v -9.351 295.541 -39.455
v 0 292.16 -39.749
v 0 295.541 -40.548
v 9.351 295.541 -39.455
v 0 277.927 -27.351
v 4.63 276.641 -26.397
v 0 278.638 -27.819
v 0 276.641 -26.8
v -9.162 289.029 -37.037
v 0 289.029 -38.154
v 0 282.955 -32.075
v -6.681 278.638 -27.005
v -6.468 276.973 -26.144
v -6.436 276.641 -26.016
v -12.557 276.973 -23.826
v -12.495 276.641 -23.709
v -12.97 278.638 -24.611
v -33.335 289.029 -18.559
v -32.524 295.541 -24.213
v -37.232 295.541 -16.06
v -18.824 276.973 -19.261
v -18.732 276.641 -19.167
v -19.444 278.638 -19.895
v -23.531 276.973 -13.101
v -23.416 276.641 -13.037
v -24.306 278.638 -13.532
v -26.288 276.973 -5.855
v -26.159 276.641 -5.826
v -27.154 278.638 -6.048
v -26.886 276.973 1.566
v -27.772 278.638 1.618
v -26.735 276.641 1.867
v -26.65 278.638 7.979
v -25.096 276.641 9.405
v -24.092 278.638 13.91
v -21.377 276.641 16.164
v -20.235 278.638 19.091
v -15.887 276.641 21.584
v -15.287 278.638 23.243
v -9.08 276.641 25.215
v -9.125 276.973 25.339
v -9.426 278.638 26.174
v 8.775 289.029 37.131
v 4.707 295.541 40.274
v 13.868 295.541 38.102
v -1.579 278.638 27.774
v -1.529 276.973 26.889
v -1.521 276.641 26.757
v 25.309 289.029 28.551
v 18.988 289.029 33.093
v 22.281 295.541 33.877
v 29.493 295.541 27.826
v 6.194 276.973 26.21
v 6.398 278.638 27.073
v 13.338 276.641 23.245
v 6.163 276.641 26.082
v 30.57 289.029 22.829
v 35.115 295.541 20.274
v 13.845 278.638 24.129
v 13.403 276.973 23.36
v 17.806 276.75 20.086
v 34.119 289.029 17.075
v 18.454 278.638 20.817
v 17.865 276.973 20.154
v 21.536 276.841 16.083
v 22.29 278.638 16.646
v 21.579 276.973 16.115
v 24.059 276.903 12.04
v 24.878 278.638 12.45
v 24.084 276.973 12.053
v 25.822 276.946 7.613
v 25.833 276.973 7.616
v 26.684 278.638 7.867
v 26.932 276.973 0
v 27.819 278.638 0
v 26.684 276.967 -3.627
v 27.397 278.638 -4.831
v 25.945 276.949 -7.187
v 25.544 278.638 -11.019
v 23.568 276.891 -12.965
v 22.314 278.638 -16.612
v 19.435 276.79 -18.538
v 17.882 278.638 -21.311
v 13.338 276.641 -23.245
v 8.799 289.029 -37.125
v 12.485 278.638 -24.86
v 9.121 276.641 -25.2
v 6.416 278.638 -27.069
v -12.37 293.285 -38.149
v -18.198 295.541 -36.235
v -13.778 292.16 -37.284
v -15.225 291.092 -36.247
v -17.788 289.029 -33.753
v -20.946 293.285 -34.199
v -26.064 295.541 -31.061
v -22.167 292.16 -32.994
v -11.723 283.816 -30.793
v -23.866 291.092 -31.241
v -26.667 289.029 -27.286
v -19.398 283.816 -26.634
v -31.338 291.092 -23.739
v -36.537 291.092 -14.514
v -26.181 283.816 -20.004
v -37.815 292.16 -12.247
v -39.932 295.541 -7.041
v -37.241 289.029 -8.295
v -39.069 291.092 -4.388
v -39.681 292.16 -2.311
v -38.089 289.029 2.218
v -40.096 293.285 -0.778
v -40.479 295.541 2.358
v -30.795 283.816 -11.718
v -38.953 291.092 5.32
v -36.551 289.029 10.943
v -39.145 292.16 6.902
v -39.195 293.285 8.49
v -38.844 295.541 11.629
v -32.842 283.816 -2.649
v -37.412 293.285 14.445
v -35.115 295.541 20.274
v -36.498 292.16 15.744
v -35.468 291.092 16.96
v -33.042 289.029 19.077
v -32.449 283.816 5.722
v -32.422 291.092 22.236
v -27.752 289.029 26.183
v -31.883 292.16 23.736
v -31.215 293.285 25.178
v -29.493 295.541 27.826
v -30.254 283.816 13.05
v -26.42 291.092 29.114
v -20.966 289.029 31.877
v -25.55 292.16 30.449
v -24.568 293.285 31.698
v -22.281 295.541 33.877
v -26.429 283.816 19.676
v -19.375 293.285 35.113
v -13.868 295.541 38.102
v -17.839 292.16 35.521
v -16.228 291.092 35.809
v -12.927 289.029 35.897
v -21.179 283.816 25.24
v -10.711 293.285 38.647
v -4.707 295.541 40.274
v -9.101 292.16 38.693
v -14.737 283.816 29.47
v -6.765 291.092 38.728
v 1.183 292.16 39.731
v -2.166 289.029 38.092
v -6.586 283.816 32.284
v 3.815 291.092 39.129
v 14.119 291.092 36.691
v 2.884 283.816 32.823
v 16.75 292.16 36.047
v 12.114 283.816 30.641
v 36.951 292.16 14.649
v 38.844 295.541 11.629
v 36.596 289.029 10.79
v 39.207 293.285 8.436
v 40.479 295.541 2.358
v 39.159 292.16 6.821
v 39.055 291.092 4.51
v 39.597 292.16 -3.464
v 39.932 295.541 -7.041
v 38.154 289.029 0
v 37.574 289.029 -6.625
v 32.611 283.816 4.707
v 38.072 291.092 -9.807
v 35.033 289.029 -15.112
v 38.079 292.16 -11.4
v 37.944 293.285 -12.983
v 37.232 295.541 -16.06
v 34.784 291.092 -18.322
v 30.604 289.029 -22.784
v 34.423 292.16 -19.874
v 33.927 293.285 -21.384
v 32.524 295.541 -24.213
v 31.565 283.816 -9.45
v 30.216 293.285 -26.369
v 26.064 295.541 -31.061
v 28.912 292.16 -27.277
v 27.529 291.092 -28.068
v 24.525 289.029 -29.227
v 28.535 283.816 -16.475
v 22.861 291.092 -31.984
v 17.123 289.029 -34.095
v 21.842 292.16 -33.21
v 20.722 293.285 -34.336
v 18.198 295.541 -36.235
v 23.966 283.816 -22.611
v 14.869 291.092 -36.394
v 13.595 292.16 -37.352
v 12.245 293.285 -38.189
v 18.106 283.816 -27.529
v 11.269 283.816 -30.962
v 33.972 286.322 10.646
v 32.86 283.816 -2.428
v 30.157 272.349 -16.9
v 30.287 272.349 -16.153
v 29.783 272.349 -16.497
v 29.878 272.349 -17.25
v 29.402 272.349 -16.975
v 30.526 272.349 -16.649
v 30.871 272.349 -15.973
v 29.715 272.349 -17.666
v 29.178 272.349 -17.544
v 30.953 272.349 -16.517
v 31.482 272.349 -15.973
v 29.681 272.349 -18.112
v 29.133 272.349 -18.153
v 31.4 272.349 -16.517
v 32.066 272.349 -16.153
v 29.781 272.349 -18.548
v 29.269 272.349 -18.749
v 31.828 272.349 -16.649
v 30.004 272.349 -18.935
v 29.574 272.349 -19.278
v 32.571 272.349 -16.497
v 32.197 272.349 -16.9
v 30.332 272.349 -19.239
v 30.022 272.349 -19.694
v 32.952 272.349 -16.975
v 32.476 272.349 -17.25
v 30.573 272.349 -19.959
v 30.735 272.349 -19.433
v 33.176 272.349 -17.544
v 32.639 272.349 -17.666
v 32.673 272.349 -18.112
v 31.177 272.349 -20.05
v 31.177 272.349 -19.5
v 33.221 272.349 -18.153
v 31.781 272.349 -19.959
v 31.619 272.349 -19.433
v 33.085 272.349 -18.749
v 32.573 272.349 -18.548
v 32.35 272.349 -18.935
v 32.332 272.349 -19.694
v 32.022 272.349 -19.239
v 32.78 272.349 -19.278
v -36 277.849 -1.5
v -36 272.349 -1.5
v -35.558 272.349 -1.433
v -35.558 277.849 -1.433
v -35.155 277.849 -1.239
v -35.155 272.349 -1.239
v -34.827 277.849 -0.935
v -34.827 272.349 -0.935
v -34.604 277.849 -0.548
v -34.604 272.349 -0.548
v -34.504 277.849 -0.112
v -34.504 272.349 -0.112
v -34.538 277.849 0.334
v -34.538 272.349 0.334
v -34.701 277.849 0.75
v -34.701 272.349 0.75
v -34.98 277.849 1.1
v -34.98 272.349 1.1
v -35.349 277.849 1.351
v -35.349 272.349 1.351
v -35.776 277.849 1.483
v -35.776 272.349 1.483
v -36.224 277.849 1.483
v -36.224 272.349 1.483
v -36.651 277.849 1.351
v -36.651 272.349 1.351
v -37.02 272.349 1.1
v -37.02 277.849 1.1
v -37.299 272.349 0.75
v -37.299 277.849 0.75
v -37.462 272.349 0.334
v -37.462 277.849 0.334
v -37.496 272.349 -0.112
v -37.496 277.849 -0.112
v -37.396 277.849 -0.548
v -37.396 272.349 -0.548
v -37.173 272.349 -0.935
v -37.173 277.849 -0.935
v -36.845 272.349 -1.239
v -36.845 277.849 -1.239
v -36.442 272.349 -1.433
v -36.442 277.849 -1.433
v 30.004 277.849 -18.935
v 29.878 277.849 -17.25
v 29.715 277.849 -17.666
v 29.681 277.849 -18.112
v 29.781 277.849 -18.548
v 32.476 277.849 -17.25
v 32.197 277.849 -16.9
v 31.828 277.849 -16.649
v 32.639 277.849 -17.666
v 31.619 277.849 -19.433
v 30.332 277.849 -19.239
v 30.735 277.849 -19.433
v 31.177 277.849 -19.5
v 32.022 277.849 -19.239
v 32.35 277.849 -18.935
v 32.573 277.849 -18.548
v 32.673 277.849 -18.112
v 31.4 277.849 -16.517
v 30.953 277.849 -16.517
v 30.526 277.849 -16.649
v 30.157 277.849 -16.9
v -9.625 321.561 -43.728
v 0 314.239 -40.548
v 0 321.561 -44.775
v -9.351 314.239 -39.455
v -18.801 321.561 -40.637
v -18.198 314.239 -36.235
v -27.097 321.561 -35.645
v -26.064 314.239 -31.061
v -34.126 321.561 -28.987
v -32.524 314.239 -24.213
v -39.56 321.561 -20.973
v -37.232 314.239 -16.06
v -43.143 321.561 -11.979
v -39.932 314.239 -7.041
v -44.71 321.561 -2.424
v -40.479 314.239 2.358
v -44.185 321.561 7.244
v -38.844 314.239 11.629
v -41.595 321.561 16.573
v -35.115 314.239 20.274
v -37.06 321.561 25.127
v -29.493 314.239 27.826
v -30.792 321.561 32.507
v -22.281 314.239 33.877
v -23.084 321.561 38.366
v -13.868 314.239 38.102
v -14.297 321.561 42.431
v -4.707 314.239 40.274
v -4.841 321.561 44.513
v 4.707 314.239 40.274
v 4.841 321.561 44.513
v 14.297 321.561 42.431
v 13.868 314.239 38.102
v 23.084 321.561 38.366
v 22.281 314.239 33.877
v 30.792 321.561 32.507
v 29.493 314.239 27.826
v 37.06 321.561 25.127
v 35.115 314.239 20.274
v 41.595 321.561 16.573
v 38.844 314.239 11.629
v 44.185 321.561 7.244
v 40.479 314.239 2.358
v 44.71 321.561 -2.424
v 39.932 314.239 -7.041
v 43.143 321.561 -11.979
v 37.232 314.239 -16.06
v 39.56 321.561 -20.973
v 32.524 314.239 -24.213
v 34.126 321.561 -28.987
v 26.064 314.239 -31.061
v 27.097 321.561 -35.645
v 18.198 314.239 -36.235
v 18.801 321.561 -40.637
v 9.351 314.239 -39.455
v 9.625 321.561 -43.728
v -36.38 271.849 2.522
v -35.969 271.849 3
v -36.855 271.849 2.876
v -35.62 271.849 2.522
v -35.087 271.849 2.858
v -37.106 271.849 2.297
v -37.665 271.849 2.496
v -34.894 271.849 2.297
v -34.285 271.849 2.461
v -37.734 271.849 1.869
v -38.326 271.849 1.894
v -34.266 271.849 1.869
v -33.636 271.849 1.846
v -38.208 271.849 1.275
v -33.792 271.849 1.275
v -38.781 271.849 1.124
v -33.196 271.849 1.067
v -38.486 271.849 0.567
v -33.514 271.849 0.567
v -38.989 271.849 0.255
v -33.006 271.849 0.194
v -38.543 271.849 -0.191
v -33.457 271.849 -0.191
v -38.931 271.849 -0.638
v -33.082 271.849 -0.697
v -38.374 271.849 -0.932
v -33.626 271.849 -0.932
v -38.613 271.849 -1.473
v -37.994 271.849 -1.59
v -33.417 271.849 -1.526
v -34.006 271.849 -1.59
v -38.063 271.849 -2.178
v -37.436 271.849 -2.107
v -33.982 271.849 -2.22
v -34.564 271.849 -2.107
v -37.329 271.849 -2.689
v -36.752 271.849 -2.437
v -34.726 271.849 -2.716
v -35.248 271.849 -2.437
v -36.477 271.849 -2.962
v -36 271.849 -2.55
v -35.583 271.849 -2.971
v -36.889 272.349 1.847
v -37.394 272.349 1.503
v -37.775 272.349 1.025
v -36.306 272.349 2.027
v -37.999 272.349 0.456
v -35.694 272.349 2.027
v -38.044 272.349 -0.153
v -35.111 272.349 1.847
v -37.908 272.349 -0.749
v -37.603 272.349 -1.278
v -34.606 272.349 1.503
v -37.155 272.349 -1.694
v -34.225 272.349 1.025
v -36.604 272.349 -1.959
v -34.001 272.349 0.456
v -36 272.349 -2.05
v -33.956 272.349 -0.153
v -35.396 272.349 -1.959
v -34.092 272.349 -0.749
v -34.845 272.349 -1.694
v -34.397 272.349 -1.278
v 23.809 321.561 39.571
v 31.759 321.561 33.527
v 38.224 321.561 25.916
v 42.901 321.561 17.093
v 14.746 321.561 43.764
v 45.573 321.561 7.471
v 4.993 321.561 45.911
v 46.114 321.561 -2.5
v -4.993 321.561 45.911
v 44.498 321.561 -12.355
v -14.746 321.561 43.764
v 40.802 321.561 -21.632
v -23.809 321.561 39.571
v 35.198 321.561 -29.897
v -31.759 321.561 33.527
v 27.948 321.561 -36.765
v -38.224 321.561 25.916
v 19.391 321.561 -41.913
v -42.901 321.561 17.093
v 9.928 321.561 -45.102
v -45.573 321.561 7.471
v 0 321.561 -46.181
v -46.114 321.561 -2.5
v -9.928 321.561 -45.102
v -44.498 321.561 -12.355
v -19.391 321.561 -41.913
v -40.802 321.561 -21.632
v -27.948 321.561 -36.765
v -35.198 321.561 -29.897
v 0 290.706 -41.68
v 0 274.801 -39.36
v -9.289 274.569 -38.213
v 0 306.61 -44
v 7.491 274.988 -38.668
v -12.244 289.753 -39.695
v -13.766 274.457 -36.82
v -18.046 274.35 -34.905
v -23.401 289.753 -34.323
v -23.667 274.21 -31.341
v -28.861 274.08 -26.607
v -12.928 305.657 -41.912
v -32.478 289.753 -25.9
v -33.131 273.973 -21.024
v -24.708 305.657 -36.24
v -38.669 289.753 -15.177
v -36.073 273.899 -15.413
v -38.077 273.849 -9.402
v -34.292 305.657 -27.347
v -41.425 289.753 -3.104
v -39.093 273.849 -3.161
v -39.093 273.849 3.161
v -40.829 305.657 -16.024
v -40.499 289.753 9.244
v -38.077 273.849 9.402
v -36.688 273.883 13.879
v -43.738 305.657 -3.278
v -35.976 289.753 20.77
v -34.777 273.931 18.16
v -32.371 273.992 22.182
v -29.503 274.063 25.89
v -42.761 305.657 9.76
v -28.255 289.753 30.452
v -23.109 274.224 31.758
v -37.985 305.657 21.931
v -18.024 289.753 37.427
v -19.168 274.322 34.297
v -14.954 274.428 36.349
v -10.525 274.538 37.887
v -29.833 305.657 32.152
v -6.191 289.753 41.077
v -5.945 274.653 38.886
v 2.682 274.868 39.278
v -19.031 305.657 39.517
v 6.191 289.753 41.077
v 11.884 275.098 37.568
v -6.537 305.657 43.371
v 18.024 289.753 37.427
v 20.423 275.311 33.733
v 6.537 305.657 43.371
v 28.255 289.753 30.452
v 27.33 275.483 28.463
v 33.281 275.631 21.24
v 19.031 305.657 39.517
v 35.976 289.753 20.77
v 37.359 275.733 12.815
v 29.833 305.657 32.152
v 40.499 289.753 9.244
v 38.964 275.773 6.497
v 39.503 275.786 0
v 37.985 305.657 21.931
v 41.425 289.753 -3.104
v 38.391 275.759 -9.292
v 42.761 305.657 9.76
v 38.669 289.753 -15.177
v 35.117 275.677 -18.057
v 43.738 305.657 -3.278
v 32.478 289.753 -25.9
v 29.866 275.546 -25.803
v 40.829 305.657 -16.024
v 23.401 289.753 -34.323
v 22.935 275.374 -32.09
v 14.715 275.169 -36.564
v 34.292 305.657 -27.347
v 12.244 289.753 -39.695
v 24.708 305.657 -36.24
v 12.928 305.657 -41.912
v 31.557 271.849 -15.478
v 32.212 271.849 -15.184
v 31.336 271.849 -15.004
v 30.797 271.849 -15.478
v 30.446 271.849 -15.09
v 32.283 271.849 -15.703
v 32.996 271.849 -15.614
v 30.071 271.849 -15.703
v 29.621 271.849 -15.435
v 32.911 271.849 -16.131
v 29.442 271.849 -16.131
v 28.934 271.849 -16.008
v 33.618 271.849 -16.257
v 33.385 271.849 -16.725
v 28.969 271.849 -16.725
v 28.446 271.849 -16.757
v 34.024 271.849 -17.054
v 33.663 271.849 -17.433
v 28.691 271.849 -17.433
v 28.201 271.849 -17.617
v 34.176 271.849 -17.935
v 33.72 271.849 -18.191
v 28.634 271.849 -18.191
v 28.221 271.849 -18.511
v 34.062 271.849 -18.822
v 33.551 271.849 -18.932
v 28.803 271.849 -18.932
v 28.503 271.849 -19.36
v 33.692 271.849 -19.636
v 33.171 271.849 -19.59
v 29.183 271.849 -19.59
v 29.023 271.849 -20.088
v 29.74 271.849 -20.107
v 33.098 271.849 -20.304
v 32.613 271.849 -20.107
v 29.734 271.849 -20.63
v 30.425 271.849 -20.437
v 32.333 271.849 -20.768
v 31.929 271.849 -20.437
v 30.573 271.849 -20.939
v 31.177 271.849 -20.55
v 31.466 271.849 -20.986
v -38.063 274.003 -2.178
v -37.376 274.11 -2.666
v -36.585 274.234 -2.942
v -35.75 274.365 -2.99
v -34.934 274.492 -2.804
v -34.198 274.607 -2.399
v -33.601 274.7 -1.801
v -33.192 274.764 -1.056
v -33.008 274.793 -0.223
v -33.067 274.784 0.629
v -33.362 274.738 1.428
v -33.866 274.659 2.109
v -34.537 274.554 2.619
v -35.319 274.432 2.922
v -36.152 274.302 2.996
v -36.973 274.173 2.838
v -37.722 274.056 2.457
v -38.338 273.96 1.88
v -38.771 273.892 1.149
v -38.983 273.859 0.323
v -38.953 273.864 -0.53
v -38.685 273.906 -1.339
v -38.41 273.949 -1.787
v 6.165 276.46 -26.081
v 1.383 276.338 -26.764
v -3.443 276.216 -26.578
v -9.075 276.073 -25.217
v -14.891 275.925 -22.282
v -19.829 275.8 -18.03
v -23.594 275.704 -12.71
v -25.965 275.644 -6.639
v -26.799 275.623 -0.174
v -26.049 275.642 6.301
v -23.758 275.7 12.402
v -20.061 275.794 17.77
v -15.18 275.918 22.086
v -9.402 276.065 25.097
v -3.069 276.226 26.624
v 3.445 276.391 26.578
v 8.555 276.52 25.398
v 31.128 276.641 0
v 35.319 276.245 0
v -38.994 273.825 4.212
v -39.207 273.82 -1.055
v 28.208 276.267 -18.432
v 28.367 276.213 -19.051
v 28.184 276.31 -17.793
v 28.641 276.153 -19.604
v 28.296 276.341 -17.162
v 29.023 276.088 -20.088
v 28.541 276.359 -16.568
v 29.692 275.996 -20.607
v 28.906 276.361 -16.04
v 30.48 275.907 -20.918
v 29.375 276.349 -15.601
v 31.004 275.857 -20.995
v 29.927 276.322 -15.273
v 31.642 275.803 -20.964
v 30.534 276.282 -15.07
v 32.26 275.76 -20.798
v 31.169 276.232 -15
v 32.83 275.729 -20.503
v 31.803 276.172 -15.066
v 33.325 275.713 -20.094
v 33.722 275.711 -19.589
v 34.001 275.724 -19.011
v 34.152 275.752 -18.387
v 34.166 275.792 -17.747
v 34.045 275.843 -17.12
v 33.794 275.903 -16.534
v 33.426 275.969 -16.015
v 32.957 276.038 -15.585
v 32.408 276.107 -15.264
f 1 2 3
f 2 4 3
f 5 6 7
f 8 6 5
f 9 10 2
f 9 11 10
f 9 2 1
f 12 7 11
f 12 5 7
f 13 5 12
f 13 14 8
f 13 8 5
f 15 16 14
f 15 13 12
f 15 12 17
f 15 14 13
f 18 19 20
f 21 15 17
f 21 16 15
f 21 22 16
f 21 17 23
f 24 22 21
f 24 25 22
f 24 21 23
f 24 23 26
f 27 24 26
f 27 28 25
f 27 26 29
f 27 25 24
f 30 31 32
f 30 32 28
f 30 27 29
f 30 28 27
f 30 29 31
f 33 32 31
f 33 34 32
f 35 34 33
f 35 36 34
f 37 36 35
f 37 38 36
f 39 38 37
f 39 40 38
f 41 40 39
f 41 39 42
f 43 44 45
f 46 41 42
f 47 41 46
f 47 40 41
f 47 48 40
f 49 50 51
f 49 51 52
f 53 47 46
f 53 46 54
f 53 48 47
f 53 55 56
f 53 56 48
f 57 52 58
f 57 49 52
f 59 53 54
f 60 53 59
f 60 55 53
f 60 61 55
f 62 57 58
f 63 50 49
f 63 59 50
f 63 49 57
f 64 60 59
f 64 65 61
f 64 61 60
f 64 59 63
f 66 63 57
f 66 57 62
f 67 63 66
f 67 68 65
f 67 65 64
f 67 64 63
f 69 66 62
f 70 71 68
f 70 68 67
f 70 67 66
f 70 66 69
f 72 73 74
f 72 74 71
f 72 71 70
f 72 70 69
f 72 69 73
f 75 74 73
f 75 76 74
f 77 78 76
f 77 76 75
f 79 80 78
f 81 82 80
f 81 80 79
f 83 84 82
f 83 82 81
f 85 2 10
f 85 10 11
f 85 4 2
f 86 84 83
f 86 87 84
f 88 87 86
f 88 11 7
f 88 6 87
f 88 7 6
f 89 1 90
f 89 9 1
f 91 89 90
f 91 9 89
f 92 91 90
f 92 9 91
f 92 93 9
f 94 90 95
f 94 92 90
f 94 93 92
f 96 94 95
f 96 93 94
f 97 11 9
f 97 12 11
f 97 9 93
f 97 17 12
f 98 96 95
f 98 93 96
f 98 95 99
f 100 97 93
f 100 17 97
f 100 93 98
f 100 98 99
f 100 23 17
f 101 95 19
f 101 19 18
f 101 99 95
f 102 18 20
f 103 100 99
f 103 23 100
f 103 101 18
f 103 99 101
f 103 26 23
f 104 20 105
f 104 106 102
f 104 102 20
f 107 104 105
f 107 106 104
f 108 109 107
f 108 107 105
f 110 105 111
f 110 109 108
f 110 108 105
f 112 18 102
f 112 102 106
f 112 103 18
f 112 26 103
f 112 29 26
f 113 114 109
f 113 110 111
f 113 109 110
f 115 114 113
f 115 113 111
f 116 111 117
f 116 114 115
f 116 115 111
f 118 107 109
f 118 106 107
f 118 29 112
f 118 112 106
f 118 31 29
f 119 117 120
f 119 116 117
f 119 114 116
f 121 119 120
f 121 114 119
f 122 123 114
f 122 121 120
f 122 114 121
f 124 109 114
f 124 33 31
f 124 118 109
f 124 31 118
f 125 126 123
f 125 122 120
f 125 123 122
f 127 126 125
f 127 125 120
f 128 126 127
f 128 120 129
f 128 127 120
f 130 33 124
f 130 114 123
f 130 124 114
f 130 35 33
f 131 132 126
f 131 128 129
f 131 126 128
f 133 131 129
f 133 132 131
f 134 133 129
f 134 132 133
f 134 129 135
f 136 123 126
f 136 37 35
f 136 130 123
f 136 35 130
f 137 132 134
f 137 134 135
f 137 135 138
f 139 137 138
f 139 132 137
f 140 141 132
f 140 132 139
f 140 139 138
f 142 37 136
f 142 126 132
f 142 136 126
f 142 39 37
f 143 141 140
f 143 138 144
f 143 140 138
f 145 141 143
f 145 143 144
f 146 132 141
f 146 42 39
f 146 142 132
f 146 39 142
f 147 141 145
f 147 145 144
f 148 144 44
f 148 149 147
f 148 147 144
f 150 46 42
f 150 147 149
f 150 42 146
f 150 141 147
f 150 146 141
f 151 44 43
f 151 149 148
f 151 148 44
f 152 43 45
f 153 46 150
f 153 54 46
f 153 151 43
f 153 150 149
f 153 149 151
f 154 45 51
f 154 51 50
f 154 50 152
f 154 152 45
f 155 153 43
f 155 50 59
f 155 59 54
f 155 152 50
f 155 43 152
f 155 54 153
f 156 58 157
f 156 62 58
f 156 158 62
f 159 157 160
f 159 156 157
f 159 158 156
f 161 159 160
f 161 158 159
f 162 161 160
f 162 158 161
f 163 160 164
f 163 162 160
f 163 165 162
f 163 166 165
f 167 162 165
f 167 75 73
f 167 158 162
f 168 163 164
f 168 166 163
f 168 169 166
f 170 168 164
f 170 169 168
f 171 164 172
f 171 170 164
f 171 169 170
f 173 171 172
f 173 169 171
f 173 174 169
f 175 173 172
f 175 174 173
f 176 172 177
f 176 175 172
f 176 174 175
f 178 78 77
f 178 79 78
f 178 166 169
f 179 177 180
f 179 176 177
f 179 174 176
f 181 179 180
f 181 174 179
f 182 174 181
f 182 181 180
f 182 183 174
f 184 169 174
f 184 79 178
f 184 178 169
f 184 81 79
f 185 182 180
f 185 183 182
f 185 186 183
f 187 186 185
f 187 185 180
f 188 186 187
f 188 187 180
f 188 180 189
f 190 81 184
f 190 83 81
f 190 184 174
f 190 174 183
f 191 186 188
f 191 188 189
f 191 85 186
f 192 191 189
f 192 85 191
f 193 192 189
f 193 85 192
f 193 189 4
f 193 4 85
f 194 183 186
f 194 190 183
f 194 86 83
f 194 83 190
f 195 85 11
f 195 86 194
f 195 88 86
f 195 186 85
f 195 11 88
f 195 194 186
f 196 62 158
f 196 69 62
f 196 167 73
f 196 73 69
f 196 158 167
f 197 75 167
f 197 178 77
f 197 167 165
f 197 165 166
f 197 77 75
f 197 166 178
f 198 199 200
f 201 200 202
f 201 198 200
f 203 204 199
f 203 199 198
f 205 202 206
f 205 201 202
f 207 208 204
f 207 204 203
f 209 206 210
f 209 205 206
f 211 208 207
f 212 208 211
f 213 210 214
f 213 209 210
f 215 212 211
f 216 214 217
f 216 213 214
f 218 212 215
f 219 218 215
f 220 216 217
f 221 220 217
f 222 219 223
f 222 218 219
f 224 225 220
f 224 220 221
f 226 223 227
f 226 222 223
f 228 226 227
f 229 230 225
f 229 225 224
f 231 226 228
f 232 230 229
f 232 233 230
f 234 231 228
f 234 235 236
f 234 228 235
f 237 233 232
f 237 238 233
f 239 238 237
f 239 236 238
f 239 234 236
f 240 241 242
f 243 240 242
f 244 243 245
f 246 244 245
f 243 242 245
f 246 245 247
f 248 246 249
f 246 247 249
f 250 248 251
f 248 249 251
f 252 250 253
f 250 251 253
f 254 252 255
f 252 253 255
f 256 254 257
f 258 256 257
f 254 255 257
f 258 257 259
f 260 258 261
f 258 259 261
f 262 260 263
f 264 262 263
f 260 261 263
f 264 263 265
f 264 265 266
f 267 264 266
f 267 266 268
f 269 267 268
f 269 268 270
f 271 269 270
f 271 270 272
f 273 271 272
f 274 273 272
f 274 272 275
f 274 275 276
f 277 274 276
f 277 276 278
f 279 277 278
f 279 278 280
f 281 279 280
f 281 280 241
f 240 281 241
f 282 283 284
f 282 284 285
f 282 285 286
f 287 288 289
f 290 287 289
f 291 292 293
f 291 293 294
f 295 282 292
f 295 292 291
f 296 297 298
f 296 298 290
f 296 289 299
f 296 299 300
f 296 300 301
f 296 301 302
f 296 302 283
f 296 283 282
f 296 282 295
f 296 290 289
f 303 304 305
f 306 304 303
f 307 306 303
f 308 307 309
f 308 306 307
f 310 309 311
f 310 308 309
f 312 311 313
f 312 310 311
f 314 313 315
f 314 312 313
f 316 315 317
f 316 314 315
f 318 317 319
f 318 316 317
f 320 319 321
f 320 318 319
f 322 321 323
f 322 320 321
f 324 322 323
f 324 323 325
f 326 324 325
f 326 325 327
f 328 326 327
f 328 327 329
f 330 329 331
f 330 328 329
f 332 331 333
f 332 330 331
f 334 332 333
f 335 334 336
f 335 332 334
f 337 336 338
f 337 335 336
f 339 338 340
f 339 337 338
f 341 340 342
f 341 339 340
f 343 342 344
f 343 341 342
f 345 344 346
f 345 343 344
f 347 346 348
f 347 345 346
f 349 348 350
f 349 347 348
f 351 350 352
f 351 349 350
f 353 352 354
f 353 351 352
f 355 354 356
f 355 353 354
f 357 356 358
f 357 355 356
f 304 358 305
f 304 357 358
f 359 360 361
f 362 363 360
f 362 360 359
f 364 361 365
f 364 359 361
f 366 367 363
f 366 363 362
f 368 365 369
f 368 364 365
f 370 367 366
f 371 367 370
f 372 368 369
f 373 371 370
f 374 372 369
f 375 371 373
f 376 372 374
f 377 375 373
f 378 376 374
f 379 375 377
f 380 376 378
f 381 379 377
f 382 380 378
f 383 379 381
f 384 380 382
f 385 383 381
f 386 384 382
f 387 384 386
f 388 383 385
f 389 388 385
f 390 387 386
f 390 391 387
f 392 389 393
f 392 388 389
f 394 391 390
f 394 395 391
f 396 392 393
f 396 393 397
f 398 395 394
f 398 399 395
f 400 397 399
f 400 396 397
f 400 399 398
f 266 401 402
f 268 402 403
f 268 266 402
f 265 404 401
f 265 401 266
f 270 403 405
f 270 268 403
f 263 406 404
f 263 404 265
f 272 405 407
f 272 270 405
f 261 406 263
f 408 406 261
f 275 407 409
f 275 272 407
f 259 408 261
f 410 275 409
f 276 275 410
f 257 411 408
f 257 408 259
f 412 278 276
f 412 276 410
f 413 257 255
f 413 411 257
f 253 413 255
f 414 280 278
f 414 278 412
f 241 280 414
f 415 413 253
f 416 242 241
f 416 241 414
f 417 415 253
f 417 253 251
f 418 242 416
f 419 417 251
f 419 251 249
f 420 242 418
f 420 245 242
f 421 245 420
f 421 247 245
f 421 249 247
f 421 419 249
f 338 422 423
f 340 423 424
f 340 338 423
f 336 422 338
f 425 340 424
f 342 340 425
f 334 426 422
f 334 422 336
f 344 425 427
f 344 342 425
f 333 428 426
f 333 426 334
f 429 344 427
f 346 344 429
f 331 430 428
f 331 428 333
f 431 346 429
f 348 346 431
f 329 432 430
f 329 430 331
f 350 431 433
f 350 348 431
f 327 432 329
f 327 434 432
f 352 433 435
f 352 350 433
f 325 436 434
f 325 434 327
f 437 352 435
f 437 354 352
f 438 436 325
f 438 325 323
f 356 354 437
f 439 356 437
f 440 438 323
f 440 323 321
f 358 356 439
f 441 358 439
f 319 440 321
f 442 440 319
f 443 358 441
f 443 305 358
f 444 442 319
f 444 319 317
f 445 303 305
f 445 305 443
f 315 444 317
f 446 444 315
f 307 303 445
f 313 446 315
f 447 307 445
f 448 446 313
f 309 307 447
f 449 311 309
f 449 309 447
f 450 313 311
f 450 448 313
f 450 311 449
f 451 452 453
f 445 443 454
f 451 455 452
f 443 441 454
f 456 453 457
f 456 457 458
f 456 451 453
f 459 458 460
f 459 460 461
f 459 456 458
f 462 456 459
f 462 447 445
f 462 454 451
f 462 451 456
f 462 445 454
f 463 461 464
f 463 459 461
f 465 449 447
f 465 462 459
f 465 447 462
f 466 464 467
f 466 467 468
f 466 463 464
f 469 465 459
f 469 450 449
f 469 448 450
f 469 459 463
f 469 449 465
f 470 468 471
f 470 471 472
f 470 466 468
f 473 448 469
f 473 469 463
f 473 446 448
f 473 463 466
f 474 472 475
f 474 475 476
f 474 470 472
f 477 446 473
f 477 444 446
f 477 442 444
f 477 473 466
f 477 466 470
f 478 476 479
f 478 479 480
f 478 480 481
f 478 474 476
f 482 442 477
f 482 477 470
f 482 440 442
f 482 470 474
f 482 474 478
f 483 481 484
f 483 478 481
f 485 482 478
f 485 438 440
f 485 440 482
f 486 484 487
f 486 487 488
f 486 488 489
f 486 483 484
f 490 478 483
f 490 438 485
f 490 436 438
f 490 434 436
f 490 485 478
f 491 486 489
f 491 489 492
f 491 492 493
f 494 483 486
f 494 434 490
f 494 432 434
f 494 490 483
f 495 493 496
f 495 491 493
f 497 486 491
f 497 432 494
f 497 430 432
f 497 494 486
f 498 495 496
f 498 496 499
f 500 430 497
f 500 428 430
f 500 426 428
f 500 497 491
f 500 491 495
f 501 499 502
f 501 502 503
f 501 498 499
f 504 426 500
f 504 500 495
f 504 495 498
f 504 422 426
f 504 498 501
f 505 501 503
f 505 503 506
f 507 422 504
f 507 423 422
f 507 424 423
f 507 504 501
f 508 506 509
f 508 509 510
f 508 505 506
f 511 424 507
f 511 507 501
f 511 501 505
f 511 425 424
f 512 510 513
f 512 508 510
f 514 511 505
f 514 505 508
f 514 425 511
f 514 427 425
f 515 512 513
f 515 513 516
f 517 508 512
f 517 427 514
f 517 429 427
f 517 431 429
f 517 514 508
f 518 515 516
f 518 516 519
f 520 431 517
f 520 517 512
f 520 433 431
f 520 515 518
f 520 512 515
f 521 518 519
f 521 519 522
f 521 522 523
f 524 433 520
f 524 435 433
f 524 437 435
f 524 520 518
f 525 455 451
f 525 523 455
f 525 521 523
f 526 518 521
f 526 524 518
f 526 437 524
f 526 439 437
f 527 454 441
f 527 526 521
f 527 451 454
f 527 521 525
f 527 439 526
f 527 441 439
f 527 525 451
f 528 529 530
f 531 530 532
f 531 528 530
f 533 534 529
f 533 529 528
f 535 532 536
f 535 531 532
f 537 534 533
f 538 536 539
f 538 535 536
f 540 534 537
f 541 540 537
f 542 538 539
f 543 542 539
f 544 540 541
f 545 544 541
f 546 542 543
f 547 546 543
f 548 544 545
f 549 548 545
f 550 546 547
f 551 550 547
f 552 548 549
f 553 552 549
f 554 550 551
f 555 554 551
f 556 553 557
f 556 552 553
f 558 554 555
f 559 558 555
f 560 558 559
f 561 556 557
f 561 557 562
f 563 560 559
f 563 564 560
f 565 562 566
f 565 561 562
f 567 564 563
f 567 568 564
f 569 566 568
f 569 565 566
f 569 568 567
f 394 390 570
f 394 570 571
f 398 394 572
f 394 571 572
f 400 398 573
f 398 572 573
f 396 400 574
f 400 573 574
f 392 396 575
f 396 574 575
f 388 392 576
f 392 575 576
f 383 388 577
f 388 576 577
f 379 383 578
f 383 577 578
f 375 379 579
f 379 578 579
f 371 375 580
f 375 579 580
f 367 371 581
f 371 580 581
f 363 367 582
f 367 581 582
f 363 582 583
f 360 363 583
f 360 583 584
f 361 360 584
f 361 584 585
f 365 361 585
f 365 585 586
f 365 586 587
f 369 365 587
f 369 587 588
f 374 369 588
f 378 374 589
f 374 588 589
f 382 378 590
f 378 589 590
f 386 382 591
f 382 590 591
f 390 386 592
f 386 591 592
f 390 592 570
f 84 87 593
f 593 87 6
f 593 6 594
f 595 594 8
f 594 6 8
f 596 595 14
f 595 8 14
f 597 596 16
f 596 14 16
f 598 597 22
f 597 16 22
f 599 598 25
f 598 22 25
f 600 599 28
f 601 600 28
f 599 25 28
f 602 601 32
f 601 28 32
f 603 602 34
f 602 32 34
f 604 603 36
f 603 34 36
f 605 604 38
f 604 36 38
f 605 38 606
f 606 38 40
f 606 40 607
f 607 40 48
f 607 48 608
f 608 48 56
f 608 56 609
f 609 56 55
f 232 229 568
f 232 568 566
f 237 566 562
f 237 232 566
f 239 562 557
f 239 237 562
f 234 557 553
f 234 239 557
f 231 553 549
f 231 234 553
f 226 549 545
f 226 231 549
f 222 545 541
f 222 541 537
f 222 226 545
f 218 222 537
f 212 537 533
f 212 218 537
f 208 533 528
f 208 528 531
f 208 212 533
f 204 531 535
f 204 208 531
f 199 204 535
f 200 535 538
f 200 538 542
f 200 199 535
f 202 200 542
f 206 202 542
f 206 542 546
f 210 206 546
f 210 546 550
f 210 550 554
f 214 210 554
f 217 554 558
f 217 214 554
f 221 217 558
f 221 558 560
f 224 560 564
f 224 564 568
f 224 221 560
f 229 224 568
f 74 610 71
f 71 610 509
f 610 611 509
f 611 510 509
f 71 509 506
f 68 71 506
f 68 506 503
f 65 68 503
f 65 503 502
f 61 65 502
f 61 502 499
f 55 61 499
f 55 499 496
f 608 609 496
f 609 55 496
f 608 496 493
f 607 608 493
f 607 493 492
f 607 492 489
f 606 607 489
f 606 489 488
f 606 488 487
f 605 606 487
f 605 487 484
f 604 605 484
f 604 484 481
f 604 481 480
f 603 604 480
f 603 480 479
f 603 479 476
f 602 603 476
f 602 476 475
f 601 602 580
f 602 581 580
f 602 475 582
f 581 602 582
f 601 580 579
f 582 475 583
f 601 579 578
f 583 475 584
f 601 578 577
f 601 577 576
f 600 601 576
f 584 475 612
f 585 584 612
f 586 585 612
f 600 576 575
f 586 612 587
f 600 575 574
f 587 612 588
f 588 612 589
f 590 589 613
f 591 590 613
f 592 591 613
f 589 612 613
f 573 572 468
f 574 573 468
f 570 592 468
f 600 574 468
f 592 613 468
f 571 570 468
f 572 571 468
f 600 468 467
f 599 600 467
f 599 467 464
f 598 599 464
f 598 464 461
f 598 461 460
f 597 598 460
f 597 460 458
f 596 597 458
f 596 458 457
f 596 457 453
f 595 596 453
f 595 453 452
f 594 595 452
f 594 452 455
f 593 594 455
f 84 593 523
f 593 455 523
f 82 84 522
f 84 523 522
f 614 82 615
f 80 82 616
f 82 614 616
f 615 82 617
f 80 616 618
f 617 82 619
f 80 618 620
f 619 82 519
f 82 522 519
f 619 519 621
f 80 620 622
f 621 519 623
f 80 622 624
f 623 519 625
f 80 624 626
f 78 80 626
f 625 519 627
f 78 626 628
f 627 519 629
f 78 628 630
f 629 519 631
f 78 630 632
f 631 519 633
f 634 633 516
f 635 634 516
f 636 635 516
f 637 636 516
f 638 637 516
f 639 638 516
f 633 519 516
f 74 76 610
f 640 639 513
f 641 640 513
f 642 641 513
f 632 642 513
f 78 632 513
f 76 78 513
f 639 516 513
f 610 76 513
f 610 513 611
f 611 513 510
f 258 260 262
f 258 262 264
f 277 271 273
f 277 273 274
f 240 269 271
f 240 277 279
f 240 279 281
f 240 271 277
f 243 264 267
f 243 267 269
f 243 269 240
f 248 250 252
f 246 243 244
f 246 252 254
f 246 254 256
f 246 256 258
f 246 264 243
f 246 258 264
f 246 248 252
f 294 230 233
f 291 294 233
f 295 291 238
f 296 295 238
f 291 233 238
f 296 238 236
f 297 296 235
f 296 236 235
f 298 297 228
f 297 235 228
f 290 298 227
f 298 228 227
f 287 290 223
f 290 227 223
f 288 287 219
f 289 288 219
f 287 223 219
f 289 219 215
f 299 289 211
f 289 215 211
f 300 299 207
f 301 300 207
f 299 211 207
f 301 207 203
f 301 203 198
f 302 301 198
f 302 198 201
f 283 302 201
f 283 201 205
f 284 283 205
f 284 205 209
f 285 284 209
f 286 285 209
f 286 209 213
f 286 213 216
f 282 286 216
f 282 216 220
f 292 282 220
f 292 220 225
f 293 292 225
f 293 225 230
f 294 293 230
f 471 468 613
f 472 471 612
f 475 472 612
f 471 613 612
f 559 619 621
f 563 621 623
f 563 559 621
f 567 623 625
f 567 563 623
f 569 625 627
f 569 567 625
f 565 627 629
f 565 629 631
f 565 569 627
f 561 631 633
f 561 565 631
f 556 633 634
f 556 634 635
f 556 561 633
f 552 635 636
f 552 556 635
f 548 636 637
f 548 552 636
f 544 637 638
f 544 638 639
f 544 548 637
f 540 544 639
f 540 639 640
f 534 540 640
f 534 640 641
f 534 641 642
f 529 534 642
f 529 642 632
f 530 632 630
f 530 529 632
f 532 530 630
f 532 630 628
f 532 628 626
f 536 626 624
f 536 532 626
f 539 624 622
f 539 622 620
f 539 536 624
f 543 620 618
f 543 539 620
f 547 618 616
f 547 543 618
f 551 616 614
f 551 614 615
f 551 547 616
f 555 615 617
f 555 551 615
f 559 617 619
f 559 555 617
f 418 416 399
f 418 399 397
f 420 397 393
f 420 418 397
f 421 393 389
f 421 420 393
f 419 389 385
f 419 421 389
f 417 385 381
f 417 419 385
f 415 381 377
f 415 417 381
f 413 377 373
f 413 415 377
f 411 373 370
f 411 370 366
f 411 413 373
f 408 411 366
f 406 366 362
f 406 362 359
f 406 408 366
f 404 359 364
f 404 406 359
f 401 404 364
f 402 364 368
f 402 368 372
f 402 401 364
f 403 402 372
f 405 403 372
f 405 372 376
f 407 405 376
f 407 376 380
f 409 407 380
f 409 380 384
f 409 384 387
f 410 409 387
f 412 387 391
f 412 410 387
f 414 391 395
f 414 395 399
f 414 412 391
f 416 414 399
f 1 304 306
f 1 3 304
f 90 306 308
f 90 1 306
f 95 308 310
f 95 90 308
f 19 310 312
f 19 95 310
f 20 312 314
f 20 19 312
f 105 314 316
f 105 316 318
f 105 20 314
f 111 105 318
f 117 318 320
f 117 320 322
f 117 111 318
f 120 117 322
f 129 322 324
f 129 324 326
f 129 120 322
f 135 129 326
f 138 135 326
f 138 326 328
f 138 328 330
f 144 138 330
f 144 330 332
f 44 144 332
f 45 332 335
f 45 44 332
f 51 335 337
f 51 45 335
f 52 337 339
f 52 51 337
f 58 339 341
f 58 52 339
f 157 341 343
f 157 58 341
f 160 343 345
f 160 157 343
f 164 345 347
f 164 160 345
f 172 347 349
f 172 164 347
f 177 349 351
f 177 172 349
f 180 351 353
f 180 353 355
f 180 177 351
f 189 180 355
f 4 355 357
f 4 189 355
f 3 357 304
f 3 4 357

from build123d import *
from OCP.BRepAlgoAPI import BRepAlgoAPI_Cut
from OCP.TopTools import TopTools_ListOfShape

# Parameters (mm, degrees)
SKETCH4_R                       = 3
BOSS_EXTRUDE1_DEPTH             = 2
BOSS_EXTRUDE3_REACH             = 82.882
BOSS_EXTRUDE3_END_RADIUS        = 278.75
SKETCH4_3_R                     = 3
BOSS_EXTRUDE3_DIRECTION_2_DEPTH = 2
SKETCH15_R                      = 1.5
CUT_EXTRUDE3_DEPTH              = 6
SKETCH16_R                      = 2
CUT_EXTRUDE4_DEPTH              = 0.5
CHAMFER3_SIZE                   = 0.55
SKETCH17_R                      = 26.8
CUT_EXTRUDE5_DEPTH              = 83.077692853


with BuildPart() as part:
    # Sketch2 → Revolve6 (revolve)
    with BuildSketch(Plane(origin=(0, 0, 0), x_dir=(0, 0, -1), z_dir=(1, 0, 0))):
        with BuildLine():
            Line((26.5077562, 274.996982717), (26.5077562, 273.848618937))
            Line((26.5077562, 273.848618937), (39.220771912, 273.848618937))
            Line((39.220771912, 273.848618937), (46.181267187, 321.561079724))
            Line((46.181267187, 321.561079724), (44.775299462, 321.561079724))
            Line((44.775299462, 321.561079724), (40.547674755, 314.238618937))
            Line((40.547674755, 314.238618937), (40.547674755, 295.540718438))
            add(Edge.make_bspline(
                [(40.547674755, 295.540718438), (40.447740466, 295.012709616), (40.292777353, 293.970757619), (39.930889755, 292.587532753), (39.516186416, 291.581451359), (39.108370782, 290.57804728), (38.439698054, 289.316986818), (37.331416086, 288.032583079), (36.368363881, 287.115418474), (35.630231264, 286.340079673), (35.016472726, 285.762737126), (34.394259795, 285.247169223), (33.635524662, 284.556557999), (32.920361334, 283.771384038), (32.129651901, 282.986073936), (31.485241784, 282.459482323), (30.914997208, 281.963476573), (30.371700346, 281.391298159), (29.782796159, 280.80462685), (29.227584581, 280.262154528), (28.724752618, 279.674853681), (28.180386253, 279.039651715), (27.651838315, 278.470209992), (27.308145935, 277.876839187), (26.995230081, 277.127164256), (26.597952618, 276.164510632), (26.464811583, 275.470548141), (26.5077562, 274.996982717)],
                knots=[0, 0, 0, 0, 0.062544048, 0.125088096, 0.156360121, 0.187632145, 0.250176193, 0.312720241, 0.375264289, 0.406536313, 0.437808337, 0.469080362, 0.500352386, 0.562896434, 0.594168458, 0.625440482, 0.656712506, 0.68798453, 0.719256554, 0.750528579, 0.781800603, 0.813072627, 0.844344651, 0.875616675, 0.906888699, 0.938160723, 1.000704771, 1.000704771, 1.000704771, 1.000704771], degree=3))
        make_face()
    revolve(axis=Axis((0, 5, 0), (0, 1, 0)))

    # Sketch4 → Boss-Extrude1 (add)
    with BuildSketch(Plane.XZ.offset(-273.848618937)):
        with Locations(Location((-36, 0, 0), (0, 0, 270))):
            Circle(SKETCH4_R)
        with Locations(Location((31.176914536, -18, 0), (0, 0, 270))):
            Circle(SKETCH4_R)
    extrude(amount=BOSS_EXTRUDE1_DEPTH)

    # Sketch7 → Revolve7 (revolve)
    with BuildSketch(Plane(origin=(0, 0, 0), x_dir=(0, 0, -1), z_dir=(1, 0, 0))):
        with BuildLine():
            Line((39.220771912, 273.848618937), (39.220771912, 272.319355593))
            ThreePointArc((39.220771912, 272.319355593), (32.873157949, 273.157923648), (26.5077562, 273.848618937))
            Line((26.5077562, 273.848618937), (26.5077562, 274.348618937))
            Line((26.5077562, 274.348618937), (39.220771912, 274.348618937))
            Line((39.220771912, 274.348618937), (39.220771912, 273.848618937))
        make_face()
    revolve(axis=Axis((0, 5, 0), (0, 1, 0)))


with BuildPart() as cut_revolve6_tool:
    # Sketch13 → Cut-Revolve6 (revolve)
    with BuildSketch(Plane.XY):
        with BuildLine():
            Line((39.220771912, 265.819355593), (19.220771912, 265.819355593))
            Line((19.220771912, 265.819355593), (19.220771912, 277.417327684))
            ThreePointArc((19.220771912, 277.417327684), (30.741102516, 276.673911793), (42.220771912, 275.454126993))
            Line((42.220771912, 275.454126993), (42.220771912, 265.819355593))
            Line((42.220771912, 265.819355593), (39.220771912, 265.819355593))
        make_face()
    revolve(axis=Axis((0, 274.819355593, 0), (0.025488410068669705, -0.9996751177018318, 0)))


with BuildPart() as part_1:
    add(part.part)

    # Cut-Revolve6: cut by cut_revolve6_tool, with a tolerance
    cut_revolve6_stock = TopTools_ListOfShape()
    cut_revolve6_stock.Append(part_1.part.wrapped)
    cut_revolve6_tools = TopTools_ListOfShape()
    cut_revolve6_tools.Append(cut_revolve6_tool.part.wrapped)
    cut_revolve6_cut = BRepAlgoAPI_Cut()
    cut_revolve6_cut.SetArguments(cut_revolve6_stock)
    cut_revolve6_cut.SetTools(cut_revolve6_tools)
    cut_revolve6_cut.SetFuzzyValue(0.00001)
    cut_revolve6_cut.Build()
    add(Compound.cast(cut_revolve6_cut.Shape()).solids(), mode=Mode.REPLACE)

    # Boss-Extrude3: up to this sphere (the profile starts inside it)
    boss_extrude3_end = Location((7.03416826, -1.066153319, 0)) * Sphere(BOSS_EXTRUDE3_END_RADIUS, mode=Mode.PRIVATE)
    # Sketch4<3> → Boss-Extrude3 (add, up to the surface)
    with BuildSketch(Plane.XZ.offset(-273.848618937), mode=Mode.PRIVATE) as boss_extrude3_sk1:
        with Locations(Location((-36, 0, 0), (0, 0, 226.558195767))):
            Circle(SKETCH4_3_R)
    boss_extrude3_tool1 = extrude(boss_extrude3_sk1.sketch, amount=-BOSS_EXTRUDE3_REACH, mode=Mode.PRIVATE) & boss_extrude3_end
    add(boss_extrude3_tool1.solids().sort_by_distance((-36, 273.848619, 0))[0])
    # Sketch4<3> → Boss-Extrude3 (add, up to the surface)
    with BuildSketch(Plane.XZ.offset(-273.848618937), mode=Mode.PRIVATE) as boss_extrude3_sk2:
        with Locations(Location((31.176914536, -18, 0), (0, 0, 224.101104304))):
            Circle(SKETCH4_3_R)
    boss_extrude3_tool2 = extrude(boss_extrude3_sk2.sketch, amount=-BOSS_EXTRUDE3_REACH, mode=Mode.PRIVATE) & boss_extrude3_end
    add(boss_extrude3_tool2.solids().sort_by_distance((31.176915, 273.848619, -18))[0])

    # Sketch4<3> → Boss-Extrude3 direction 2 (add)
    with BuildSketch(Plane.XZ.offset(-273.848618937)):
        with Locations(Location((-36, 0, 0), (0, 0, 226.558195767))):
            Circle(SKETCH4_3_R)
        with Locations(Location((31.176914536, -18, 0), (0, 0, 224.101104304))):
            Circle(SKETCH4_3_R)
    extrude(amount=BOSS_EXTRUDE3_DIRECTION_2_DEPTH)

    # Sketch15 → Cut-Extrude3 (cut)
    with BuildSketch(Plane.XZ.offset(-271.848618937)):
        with Locations(Location((-36, 0, 0), (0, 0, 270))):
            Circle(SKETCH15_R)
        with Locations(Location((31.176914536, -18, 0), (0, 0, 270))):
            Circle(SKETCH15_R)
    extrude(amount=-CUT_EXTRUDE3_DEPTH, mode=Mode.SUBTRACT)

    # Sketch16 → Cut-Extrude4 (cut)
    with BuildSketch(Plane.XZ.offset(-271.848618937)):
        with Locations(Location((-36, 0, 0), (0, 0, 270))):
            Circle(SKETCH16_R)
        with Locations(Location((31.176914536, -18, 0), (0, 0, 270))):
            Circle(SKETCH16_R)
    extrude(amount=-CUT_EXTRUDE4_DEPTH, mode=Mode.SUBTRACT)

    # Chamfer3
    # the kernel refuses this chamfer: 0.55 mm, written as the material it takes off along each edge
    with BuildSketch(Plane(origin=(-36, 271.848618937, 0), x_dir=(0, 0, -1), z_dir=(-1, 0, 0))) as chamfer3_piece_1_section:
        Polygon((2 + CHAMFER3_SIZE, 0), (2, -CHAMFER3_SIZE), (2, 0), align=None)
    chamfer3_piece_1 = revolve(axis=Axis((-36, 271.848618937, 0), (0, -1, 0)), mode=Mode.PRIVATE)
    chamfer3_piece_1 = split(chamfer3_piece_1, bisect_by=Plane(origin=(-36, 272.348618937, 0), z_dir=(0, -1, 0)), keep=Keep.TOP, mode=Mode.PRIVATE)
    add(chamfer3_piece_1, mode=Mode.SUBTRACT)
    with BuildSketch(Plane(origin=(31.176914536, 271.848618937, -18), x_dir=(0, 0, -1), z_dir=(-1, 0, 0))) as chamfer3_piece_2_section:
        Polygon((2 + CHAMFER3_SIZE, 0), (2, -CHAMFER3_SIZE), (2, 0), align=None)
    chamfer3_piece_2 = revolve(axis=Axis((31.176914536, 271.848618937, -18), (0, -1, 0)), mode=Mode.PRIVATE)
    chamfer3_piece_2 = split(chamfer3_piece_2, bisect_by=Plane(origin=(31.176914536, 272.348618937, -18), z_dir=(0, -1, 0)), keep=Keep.TOP, mode=Mode.PRIVATE)
    add(chamfer3_piece_2, mode=Mode.SUBTRACT)

    # Sketch17 → Cut-Extrude5 (cut, through all)
    with BuildSketch(Plane(origin=(0, 321.561079724, 0), x_dir=(1, 0, 0), z_dir=(0, 1, 0))):
        Circle(SKETCH17_R)
    extrude(amount=-CUT_EXTRUDE5_DEPTH, mode=Mode.SUBTRACT)


solid = part_1.part
